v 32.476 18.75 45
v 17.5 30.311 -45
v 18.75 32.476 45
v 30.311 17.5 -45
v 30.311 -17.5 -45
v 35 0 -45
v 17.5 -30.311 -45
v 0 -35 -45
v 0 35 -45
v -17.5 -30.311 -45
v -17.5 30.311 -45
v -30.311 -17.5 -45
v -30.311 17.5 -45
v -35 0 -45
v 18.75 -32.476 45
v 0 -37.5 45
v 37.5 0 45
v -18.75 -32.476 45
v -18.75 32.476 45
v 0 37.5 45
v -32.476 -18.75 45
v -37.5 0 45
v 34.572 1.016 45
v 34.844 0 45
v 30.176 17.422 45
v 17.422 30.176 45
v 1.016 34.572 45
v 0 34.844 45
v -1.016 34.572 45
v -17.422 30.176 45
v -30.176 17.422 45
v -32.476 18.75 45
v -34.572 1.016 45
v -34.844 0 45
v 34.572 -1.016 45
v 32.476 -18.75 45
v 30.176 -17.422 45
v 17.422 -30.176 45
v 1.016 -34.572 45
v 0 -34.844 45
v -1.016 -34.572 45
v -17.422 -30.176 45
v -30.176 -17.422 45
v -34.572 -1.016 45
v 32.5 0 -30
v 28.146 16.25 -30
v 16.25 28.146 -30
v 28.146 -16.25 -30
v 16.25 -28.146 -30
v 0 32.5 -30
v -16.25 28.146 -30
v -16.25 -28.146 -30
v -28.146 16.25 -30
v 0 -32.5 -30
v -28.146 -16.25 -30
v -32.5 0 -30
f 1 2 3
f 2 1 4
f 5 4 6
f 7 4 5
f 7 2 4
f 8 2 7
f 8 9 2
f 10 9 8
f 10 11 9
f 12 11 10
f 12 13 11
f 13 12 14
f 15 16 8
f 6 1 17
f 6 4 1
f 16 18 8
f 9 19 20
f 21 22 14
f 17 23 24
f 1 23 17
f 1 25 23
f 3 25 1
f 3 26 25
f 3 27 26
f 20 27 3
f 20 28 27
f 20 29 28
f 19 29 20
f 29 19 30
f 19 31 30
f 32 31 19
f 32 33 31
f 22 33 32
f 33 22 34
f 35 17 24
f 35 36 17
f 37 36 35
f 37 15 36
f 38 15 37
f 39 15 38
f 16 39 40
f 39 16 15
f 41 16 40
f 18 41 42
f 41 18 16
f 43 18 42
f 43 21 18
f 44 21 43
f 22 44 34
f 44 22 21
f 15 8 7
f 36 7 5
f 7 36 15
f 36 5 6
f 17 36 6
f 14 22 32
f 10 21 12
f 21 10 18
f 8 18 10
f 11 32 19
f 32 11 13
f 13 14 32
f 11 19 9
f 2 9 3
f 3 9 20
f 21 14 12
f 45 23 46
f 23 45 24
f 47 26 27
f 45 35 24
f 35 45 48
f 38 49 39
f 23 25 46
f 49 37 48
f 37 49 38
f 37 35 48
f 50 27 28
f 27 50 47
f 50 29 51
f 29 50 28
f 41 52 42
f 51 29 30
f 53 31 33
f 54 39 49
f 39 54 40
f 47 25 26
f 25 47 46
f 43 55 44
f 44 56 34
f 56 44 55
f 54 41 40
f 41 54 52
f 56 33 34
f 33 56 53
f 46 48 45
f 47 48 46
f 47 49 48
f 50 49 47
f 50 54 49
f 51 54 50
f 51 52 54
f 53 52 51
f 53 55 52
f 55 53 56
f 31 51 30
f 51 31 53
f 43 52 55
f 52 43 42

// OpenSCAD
// bicchiere cilindro
base_larghezza = 70;
base_lunghezza = base_larghezza;
base_altezza = 90;
spessore = 5;
rialzo = 10;
apertura = 5;
top_larghezza = base_larghezza - spessore;
top_lunghezza = base_lunghezza - spessore;
top_altezza = base_altezza - rialzo;
$fn = 12;

difference() {
    // esterno
    cylinder(h = base_altezza, d1 = base_larghezza, d2 = base_larghezza + apertura, center = true);

    // interno
    translate([0,0,rialzo])
    cylinder(h = top_altezza, d1 = top_larghezza, d2 = top_larghezza + apertura, center = true);
}
